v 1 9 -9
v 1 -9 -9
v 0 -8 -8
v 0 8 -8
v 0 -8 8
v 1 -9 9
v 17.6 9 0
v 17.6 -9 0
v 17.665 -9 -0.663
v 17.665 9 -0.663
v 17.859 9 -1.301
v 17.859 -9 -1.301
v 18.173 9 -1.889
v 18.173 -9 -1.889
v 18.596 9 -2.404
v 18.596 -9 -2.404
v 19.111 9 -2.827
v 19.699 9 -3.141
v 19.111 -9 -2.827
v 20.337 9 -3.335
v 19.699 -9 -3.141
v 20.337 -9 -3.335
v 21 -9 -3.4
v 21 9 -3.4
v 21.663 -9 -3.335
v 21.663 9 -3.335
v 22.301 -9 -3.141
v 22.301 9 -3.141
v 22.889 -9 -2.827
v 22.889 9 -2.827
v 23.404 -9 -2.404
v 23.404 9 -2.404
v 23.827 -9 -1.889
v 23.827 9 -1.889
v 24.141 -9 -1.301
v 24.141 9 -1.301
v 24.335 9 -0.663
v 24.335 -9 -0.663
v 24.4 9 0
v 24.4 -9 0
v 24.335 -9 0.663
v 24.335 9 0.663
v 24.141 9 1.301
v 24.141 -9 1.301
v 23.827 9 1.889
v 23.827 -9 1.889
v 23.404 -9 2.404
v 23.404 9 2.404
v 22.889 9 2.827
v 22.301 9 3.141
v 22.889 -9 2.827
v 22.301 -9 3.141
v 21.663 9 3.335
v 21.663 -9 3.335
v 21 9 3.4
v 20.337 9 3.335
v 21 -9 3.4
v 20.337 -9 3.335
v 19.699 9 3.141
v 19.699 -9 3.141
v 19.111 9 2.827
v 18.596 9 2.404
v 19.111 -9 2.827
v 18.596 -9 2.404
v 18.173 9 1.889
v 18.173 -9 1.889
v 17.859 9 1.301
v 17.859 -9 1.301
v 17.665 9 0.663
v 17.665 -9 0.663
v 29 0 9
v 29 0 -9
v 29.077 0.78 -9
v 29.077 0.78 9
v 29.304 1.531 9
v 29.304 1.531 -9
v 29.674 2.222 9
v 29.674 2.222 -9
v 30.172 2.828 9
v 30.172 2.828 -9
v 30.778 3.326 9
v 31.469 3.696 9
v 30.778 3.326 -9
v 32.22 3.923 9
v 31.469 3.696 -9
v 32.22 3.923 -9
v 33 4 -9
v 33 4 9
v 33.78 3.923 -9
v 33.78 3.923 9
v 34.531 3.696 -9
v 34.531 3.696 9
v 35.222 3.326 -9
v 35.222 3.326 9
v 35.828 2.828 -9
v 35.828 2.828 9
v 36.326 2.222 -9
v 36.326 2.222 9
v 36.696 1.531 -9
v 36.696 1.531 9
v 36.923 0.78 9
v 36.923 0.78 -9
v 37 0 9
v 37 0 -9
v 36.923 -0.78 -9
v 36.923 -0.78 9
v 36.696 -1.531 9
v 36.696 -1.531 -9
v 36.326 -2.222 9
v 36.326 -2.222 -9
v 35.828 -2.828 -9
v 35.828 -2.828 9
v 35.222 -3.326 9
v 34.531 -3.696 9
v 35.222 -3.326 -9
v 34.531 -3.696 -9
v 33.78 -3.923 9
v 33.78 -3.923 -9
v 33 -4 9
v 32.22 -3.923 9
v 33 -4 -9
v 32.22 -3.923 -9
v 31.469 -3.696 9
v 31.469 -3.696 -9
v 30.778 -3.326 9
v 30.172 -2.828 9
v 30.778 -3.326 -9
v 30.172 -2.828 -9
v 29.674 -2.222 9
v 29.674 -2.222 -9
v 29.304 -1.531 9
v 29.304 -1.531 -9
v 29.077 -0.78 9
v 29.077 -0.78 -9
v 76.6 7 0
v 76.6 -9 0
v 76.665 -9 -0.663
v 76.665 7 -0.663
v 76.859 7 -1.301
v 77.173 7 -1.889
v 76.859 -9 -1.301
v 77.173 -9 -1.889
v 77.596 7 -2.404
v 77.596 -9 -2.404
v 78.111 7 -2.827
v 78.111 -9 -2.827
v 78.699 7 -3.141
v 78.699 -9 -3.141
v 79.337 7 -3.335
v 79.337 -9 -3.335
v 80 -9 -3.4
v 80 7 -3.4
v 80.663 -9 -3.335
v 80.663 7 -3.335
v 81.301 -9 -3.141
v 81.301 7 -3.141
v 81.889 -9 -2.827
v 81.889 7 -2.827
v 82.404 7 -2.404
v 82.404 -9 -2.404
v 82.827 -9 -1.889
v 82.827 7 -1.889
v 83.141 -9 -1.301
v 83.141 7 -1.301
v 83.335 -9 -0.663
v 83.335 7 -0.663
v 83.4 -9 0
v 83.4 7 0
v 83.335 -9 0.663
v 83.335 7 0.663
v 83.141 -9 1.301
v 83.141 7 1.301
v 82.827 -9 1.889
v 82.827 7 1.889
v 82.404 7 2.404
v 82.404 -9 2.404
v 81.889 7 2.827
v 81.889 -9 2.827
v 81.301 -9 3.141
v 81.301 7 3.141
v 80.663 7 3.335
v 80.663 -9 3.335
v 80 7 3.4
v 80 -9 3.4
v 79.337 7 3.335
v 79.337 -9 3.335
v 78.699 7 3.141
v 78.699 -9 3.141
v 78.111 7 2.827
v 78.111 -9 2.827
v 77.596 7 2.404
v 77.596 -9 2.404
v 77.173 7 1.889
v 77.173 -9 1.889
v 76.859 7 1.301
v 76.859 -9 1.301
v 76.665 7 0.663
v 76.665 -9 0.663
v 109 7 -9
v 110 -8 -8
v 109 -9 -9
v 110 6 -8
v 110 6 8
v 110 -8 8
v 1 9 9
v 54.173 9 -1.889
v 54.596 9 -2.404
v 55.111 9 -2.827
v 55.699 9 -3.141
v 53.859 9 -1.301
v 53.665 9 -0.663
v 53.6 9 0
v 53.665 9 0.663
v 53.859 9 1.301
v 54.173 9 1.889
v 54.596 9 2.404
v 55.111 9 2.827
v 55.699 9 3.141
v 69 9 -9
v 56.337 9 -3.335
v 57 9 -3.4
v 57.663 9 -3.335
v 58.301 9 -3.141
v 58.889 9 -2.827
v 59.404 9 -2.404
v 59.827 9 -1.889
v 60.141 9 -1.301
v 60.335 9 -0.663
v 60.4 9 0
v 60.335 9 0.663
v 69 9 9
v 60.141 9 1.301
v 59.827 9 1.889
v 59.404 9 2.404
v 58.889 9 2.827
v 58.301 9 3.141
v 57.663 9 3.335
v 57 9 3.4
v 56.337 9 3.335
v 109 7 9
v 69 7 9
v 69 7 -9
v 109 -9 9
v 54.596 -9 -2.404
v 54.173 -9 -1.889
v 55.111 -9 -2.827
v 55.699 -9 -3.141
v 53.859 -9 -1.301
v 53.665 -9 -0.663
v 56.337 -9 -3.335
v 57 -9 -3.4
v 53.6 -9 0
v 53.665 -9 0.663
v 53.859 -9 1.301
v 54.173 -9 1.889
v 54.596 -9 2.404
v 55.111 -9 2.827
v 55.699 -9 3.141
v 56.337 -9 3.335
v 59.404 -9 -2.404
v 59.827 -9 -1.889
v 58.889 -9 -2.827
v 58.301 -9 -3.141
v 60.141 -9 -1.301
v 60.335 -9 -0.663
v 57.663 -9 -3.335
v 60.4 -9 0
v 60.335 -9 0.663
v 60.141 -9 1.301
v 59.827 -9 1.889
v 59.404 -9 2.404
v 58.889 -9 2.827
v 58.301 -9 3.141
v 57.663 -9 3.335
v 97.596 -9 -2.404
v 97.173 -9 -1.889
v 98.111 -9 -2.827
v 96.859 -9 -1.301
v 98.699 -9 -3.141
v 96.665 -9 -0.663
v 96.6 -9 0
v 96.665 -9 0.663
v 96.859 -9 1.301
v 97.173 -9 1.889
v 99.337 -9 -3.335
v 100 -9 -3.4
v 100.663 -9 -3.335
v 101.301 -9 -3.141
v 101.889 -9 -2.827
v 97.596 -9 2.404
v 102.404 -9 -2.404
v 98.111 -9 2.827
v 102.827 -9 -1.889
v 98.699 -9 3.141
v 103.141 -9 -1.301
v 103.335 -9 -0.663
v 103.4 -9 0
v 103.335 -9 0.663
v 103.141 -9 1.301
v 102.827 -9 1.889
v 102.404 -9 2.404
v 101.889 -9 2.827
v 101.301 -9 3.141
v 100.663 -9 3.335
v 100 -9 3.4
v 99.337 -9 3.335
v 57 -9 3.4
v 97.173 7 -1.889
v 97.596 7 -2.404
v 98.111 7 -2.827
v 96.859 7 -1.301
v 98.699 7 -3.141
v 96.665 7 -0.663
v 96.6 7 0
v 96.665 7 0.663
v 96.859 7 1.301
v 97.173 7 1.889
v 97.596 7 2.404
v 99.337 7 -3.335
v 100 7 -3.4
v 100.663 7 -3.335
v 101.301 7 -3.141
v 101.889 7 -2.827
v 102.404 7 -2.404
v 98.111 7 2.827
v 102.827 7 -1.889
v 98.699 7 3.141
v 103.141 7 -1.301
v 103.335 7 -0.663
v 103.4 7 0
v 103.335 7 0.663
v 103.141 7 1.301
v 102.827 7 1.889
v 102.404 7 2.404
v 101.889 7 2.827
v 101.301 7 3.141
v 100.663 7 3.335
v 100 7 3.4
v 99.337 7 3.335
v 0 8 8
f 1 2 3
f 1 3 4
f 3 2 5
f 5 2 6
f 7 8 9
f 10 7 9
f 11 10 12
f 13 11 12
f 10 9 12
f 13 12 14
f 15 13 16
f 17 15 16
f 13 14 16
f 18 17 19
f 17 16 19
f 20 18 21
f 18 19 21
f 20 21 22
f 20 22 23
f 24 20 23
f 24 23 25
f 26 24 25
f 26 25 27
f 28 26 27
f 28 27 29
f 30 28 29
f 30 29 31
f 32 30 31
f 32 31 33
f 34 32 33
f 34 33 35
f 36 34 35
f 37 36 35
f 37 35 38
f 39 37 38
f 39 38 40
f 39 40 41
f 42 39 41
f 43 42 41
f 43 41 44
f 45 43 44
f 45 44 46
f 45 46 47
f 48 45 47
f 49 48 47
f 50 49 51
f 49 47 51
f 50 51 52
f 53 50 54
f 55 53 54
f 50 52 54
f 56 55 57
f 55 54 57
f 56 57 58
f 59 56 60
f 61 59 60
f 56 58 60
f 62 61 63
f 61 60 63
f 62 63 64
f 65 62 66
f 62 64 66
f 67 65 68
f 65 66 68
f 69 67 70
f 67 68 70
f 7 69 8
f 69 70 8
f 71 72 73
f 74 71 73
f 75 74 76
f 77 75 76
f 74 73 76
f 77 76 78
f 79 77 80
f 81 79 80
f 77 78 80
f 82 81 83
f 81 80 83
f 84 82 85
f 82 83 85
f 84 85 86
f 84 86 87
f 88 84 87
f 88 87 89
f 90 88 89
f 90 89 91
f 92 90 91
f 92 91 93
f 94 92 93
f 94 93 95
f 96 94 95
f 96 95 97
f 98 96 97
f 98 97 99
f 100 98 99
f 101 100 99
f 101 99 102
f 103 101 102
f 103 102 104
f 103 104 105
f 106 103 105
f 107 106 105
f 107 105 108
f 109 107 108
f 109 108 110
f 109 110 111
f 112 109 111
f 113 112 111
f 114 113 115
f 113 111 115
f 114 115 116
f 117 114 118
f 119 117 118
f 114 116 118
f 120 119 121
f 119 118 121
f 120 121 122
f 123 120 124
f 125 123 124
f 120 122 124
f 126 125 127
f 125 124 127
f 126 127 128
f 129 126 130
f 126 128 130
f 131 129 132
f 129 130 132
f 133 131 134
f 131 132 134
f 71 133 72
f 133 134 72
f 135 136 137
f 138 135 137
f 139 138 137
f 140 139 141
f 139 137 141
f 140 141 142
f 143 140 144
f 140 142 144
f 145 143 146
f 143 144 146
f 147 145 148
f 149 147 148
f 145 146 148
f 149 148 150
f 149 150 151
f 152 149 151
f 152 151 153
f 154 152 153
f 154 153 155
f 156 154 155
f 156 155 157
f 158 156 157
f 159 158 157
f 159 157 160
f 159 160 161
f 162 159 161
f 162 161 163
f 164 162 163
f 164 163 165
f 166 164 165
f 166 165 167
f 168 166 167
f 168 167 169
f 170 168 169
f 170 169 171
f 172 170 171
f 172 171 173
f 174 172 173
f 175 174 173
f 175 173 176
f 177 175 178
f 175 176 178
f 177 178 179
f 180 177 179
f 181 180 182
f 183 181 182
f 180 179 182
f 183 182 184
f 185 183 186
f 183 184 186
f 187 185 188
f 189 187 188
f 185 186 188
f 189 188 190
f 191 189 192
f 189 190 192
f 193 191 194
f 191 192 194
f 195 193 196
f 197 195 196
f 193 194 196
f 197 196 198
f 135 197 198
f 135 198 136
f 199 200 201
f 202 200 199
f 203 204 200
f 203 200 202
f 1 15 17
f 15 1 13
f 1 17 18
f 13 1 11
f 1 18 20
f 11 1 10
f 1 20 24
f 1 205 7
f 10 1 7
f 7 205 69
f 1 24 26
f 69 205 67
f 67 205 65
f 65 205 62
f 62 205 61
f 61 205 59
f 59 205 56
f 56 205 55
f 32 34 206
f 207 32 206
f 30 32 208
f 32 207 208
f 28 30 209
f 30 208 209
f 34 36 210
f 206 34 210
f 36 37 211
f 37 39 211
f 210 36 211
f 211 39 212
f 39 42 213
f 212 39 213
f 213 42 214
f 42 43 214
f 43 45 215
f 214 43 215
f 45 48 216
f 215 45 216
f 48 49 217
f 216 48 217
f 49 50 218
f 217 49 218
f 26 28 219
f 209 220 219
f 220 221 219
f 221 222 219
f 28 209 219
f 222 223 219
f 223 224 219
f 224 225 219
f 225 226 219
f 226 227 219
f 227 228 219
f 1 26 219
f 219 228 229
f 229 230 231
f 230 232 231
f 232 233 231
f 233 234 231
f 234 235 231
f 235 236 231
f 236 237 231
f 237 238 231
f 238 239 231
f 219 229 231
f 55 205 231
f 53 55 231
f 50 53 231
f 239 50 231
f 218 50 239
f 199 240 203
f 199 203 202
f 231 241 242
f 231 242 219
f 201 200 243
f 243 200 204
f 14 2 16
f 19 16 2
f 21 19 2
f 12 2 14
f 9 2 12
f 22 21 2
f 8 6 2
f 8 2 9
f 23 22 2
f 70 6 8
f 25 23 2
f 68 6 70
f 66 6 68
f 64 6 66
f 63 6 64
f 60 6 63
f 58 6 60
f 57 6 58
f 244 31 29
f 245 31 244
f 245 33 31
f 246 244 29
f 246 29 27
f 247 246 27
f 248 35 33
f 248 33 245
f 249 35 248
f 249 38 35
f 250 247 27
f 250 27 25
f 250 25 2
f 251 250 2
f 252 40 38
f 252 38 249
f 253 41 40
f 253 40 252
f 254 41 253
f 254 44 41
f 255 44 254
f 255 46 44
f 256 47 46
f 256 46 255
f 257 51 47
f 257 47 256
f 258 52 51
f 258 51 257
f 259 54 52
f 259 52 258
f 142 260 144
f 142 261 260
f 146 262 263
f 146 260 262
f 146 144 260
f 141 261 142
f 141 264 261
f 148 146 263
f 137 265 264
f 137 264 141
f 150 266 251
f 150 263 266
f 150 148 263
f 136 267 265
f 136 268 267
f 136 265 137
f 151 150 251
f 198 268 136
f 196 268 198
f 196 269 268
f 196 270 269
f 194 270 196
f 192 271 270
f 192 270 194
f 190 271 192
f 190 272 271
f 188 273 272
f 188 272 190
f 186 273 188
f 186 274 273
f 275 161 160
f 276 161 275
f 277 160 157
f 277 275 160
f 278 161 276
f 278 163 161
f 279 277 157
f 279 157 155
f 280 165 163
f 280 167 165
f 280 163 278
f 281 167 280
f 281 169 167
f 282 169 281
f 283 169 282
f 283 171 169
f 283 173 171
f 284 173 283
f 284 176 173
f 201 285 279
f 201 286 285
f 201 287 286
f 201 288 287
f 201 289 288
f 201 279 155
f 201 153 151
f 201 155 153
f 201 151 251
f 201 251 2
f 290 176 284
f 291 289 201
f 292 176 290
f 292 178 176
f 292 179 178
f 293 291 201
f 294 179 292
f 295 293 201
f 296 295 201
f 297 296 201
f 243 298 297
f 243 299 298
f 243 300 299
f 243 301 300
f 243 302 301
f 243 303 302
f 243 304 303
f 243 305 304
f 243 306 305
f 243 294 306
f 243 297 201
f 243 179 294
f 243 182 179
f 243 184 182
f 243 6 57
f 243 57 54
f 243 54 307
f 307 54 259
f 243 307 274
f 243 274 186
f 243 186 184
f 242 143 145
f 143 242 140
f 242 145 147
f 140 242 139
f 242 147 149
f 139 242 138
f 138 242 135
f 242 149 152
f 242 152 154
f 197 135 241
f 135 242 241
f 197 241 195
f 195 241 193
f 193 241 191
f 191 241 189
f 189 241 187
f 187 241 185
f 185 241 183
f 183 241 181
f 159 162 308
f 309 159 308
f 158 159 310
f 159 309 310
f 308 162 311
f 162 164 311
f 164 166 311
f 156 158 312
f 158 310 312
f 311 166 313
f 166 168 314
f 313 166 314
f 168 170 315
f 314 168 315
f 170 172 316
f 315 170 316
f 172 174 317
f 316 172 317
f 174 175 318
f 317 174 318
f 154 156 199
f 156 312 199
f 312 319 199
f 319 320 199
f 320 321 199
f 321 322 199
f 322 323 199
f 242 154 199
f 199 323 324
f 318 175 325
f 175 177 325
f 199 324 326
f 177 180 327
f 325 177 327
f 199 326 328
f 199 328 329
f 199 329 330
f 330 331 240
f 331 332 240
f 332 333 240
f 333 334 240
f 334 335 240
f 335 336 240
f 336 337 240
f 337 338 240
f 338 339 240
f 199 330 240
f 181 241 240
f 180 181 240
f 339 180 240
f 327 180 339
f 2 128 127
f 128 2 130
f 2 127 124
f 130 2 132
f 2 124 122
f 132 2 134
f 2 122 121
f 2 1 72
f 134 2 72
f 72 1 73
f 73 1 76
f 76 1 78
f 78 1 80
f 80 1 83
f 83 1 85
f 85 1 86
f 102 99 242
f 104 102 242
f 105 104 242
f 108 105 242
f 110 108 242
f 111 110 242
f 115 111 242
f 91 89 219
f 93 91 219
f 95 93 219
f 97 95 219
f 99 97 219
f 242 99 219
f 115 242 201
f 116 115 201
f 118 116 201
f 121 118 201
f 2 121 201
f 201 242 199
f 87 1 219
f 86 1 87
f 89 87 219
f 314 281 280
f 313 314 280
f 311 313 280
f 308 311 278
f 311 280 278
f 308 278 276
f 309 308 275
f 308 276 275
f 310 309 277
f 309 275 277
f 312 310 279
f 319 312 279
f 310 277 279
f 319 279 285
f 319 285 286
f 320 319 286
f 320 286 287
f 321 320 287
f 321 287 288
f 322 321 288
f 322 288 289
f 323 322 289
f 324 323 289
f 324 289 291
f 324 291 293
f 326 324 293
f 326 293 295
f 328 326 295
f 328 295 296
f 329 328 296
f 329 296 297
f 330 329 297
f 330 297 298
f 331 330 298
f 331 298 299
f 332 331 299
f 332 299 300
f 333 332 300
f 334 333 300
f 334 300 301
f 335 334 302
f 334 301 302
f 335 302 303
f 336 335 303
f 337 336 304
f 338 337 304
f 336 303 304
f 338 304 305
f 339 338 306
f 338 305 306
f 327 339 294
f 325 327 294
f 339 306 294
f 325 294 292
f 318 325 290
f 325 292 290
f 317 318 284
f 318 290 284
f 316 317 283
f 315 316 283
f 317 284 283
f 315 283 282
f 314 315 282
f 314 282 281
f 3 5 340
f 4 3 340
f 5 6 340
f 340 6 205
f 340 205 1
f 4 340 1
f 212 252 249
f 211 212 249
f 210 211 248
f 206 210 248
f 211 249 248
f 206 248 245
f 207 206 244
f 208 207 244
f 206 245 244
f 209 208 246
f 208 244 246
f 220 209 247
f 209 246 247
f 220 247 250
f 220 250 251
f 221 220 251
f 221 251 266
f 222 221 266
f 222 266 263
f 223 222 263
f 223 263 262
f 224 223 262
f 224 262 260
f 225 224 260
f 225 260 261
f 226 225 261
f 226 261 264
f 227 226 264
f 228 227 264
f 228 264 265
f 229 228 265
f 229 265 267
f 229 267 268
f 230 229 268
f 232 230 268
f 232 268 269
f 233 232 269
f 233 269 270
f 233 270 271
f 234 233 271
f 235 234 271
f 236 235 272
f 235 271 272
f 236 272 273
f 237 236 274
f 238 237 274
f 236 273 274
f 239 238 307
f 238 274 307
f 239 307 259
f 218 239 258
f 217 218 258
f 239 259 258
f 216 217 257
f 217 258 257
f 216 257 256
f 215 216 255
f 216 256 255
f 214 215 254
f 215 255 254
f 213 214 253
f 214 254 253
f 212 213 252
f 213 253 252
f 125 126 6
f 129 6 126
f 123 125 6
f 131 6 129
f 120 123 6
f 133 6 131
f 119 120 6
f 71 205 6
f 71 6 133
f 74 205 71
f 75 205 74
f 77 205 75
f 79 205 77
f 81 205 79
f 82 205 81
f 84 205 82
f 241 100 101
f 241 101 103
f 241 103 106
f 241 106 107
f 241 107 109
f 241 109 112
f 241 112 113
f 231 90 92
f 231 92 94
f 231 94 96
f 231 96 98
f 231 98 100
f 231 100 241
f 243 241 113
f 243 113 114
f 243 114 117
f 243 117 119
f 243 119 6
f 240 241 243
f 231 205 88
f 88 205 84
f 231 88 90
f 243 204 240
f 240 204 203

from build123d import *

# Parameters (mm, degrees)
SKETCH1_W                = 110
SKETCH1_H                = 18
BOSS_EXTRUDE1_DEPTH      = 9
SKETCH2_W                = 41
SKETCH2_H                = 2
CUT_EXTRUDE1_DEPTH       = 112.825757319
F_8_0_8_DIAMETER_HOLE1_D = 8
M8_TAPPED_HOLE1_D        = 6.8
CHAMFER1_SIZE            = 1


with BuildPart() as part:
    # Sketch1 → Boss-Extrude1 (new, symmetric)
    with BuildSketch(Plane.XY):
        with Locations((55, 0)):
            Rectangle(SKETCH1_W, SKETCH1_H)
    extrude(amount=BOSS_EXTRUDE1_DEPTH, both=True)

    # Sketch2 → Cut-Extrude1 (cut, through all)
    with BuildSketch(Plane.XY.offset(9)):
        with Locations((89.5, 8)):
            Rectangle(SKETCH2_W, SKETCH2_H)
    extrude(amount=-CUT_EXTRUDE1_DEPTH, mode=Mode.SUBTRACT)

    # Ø8.0 (8) Diameter Hole1 (through all)
    with Locations(Plane.XY.offset(9)):
        with Locations((33, 0)):
            Hole(F_8_0_8_DIAMETER_HOLE1_D / 2)

    # M8 Tapped Hole1 (through all)
    with Locations(Plane(origin=(0, 9, 0), x_dir=(1, 0, 0), z_dir=(0, 1, 0))):
        with Locations((21, 0), (57, 0), (80, 0), (100, 0)):
            Hole(M8_TAPPED_HOLE1_D / 2)

    # Chamfer1
    chamfer1_edges = [part.edges().sort_by_distance(p)[0] for p in [
        (110, -1, 9),
        (110, 7, 0),
        (0, 0, 9),
        (110, -1, -9),
        (0, 0, -9),
        (0, 9, 0),
        (110, -9, 0),
        (0, -9, 0),
    ]]
    chamfer(chamfer1_edges, length=CHAMFER1_SIZE)


solid = part.part
